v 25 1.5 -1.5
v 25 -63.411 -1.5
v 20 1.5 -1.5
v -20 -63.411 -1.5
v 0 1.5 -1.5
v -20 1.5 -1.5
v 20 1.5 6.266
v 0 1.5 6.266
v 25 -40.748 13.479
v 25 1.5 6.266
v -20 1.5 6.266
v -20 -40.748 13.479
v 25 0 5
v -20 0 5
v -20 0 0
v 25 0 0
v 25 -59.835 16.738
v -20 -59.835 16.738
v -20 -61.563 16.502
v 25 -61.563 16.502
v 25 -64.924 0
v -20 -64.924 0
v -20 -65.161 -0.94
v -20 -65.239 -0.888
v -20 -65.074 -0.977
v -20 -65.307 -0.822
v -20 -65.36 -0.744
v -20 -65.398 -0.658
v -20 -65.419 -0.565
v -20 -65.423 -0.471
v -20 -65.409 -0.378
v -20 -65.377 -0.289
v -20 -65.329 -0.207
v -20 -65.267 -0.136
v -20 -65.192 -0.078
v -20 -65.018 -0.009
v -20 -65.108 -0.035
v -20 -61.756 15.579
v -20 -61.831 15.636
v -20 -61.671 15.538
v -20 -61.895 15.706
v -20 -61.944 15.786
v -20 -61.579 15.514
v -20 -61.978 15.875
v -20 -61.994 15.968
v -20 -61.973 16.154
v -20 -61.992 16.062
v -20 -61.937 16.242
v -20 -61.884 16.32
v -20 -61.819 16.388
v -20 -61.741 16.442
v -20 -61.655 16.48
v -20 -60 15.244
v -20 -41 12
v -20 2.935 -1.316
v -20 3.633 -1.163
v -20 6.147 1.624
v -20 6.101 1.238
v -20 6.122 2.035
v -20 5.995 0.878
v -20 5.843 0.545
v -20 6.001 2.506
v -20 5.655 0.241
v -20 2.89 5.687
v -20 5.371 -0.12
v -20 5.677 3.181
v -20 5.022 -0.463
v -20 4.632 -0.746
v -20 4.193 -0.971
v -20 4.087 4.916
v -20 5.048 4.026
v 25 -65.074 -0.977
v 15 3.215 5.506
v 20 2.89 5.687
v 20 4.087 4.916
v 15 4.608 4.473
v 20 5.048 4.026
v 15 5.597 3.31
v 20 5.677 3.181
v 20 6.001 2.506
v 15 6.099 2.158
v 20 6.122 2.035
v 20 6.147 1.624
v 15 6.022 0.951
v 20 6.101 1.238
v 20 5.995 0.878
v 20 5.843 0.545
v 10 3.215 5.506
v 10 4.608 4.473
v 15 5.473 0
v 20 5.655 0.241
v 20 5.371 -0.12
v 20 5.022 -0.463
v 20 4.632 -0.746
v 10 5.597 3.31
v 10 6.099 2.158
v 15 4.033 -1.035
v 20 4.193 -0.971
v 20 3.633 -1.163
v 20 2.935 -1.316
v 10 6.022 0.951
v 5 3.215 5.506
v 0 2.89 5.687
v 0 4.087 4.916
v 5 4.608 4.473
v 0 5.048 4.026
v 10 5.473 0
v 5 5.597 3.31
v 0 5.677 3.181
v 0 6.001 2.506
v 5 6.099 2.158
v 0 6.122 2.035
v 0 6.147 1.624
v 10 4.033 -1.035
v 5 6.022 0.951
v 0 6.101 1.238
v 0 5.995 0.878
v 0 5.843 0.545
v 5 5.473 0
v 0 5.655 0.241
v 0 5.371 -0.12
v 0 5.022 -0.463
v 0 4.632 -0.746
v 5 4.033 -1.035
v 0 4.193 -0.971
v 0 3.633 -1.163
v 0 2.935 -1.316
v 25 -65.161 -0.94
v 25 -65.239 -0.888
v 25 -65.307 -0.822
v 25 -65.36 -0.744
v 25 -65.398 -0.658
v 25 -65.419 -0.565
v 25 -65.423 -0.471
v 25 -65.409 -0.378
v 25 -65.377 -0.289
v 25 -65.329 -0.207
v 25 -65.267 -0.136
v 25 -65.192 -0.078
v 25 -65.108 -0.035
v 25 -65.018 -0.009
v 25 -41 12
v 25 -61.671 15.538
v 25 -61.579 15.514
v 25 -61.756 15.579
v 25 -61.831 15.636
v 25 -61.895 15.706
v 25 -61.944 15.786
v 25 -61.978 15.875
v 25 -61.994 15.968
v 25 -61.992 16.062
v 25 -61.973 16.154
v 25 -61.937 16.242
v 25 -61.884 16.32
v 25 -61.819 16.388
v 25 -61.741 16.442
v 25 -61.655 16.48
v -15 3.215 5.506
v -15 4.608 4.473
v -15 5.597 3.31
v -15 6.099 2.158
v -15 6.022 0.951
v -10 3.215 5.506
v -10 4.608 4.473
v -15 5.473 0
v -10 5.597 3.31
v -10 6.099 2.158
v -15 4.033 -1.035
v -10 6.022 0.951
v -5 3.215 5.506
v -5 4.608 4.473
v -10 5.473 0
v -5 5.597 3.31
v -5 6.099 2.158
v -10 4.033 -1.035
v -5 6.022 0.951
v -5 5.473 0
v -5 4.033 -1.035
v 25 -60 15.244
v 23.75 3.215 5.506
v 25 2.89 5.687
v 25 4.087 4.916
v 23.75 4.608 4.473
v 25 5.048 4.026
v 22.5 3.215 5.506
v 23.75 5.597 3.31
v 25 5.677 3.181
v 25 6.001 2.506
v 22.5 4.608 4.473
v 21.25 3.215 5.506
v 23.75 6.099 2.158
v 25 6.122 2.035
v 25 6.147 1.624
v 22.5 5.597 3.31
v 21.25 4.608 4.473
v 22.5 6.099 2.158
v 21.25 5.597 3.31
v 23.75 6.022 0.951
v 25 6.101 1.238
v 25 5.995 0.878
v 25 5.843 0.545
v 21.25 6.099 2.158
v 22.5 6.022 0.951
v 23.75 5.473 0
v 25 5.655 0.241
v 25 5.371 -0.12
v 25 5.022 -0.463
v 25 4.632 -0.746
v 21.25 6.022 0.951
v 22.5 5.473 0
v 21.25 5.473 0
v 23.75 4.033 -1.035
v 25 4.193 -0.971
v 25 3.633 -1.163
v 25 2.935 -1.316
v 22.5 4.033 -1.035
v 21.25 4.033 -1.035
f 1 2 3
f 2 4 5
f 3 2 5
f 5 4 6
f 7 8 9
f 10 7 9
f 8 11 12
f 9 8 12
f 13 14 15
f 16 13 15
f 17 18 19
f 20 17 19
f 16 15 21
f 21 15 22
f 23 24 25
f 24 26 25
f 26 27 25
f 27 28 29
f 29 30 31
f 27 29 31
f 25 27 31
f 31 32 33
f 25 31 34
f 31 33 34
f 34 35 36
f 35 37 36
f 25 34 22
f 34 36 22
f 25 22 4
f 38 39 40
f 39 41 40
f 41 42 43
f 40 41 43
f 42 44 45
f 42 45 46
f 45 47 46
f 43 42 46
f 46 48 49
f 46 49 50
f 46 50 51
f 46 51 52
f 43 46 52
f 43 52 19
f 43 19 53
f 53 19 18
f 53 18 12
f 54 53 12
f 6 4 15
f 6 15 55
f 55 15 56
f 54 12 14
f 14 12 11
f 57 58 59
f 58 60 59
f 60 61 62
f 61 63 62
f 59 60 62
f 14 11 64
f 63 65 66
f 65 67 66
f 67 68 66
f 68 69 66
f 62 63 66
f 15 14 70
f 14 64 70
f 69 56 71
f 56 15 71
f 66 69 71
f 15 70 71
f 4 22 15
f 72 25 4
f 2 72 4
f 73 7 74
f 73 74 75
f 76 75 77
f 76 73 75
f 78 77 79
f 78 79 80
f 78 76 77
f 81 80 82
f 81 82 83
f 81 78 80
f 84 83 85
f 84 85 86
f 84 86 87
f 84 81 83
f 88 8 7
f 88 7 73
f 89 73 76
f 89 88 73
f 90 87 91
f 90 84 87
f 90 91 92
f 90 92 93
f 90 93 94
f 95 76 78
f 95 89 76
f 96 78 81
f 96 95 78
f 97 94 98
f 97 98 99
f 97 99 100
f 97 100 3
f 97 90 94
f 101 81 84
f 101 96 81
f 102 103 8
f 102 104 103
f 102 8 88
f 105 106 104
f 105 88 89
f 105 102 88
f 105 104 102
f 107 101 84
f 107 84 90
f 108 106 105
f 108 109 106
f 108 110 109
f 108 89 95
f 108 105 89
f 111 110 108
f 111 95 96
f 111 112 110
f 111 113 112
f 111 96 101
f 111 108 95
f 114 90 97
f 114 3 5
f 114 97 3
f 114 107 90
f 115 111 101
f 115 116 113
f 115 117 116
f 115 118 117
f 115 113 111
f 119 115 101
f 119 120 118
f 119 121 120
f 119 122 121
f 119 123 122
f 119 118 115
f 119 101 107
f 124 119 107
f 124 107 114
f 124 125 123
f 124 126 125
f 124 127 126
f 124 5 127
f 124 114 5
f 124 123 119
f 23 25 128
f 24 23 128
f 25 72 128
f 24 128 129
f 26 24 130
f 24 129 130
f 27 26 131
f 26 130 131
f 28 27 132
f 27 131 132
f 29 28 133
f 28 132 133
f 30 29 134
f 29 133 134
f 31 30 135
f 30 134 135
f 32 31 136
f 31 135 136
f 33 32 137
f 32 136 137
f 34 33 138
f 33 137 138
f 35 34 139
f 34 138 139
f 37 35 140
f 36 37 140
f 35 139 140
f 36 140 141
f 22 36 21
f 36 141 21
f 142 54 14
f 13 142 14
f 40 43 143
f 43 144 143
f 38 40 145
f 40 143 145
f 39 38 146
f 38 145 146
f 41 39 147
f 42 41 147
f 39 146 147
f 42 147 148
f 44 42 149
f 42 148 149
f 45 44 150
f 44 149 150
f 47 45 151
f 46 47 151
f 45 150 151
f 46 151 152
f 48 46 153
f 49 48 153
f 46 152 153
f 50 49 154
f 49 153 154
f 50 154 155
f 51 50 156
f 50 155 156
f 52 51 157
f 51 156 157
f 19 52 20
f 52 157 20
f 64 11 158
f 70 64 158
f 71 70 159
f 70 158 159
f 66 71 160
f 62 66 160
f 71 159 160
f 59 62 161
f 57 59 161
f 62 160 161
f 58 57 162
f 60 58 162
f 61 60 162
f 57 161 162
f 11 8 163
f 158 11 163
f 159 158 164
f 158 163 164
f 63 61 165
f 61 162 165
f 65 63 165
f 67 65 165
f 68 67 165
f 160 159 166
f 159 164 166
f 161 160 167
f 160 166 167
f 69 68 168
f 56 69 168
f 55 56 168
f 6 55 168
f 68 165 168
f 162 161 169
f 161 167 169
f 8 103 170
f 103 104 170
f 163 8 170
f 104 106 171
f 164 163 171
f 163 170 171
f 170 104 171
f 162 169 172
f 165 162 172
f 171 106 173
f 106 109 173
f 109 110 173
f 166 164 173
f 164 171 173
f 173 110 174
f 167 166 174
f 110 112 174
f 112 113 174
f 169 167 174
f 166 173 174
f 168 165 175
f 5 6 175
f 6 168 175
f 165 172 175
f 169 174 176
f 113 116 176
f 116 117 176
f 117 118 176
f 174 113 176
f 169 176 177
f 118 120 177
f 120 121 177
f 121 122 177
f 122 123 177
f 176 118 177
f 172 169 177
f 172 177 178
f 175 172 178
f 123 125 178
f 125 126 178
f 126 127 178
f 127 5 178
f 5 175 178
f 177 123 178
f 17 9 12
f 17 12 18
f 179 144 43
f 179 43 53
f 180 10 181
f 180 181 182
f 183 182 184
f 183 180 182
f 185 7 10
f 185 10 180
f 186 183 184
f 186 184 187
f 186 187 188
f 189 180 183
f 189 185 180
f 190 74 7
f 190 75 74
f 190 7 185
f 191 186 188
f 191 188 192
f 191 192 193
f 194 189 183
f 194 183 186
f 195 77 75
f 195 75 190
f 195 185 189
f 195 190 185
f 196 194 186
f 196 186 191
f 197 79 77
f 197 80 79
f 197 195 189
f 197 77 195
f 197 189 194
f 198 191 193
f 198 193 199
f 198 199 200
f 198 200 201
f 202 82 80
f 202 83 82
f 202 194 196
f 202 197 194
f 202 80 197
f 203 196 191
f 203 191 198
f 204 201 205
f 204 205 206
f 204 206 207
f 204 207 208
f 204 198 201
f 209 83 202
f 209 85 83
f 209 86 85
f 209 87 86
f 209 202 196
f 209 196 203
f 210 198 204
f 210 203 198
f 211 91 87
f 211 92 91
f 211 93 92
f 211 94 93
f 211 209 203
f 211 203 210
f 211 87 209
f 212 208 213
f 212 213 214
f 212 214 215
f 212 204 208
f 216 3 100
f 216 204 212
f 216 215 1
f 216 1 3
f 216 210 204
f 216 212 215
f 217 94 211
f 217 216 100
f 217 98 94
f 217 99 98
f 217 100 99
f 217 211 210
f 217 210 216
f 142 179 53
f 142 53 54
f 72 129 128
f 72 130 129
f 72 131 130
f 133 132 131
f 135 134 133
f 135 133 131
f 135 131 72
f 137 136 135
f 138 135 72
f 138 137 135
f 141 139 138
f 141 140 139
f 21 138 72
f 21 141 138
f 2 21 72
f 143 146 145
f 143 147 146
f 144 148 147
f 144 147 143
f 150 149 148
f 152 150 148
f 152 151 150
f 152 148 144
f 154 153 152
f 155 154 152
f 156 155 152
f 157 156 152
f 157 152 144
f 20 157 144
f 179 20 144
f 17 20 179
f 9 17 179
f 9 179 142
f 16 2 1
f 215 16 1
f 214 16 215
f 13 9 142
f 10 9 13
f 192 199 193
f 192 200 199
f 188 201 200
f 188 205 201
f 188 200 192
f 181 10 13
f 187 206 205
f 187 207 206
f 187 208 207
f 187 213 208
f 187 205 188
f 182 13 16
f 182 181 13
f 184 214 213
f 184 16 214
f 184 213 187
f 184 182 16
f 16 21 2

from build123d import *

# Parameters (mm, degrees)
F1_DEPTH = 20
F2_DEPTH = 25
F3_R     = 0.5


with BuildPart() as f1:
    # F0 (on Right) → F1 (new body, symmetric)
    with BuildSketch(Plane.YZ):
        with BuildLine():
            Line((-41, 12), (0, 5))
            Line((0, 5), (0, 0))
            Line((0, 0), (-13, 0))
            Line((-13, 0), (-60, 0))
            Line((-60, 0), (-68.1802767269, 0))
            Line((-68.1802767269, 0), (-63.4105807199, -1.5))
            Line((-63.4105807199, -1.5), (-15.9391719951, -1.5))
            Line((-15.9391719951, -1.5), (1.5, -1.5))
            add(Edge.make_bspline(
                [(1.5, 6.265607391), (3.9644898677, 5.4991167031), (6.8949081715, 2.4881725012), (5.5893039586, -0.1081592765), (4.0791571197, -1.2143747147), (2.4017938603, -1.4076838823), (1.5, -1.5)],
                knots=[0, 0, 0, 0, 0.3589021343, 0.5755750332, 0.7680765927, 1, 1, 1, 1], degree=3))
            Line((1.5, 6.265607391), (-40.7475553057, 13.4786046383))
            Line((-40.7475553057, 13.4786046383), (-59.8354584084, 16.7375149241))
            Line((-59.8354584084, 16.7375149241), (-64.7895661956, 16.0616332529))
            Line((-64.7895661956, 16.0616332529), (-60, 15.243902439))
            Line((-60, 15.243902439), (-41, 12))
        make_face()
    extrude(amount=F1_DEPTH, both=True)

    # F0 (on Right) → F2 (join)
    with BuildSketch(Plane.YZ):
        with BuildLine():
            Line((-41, 12), (0, 5))
            Line((0, 5), (0, 0))
            Line((0, 0), (-13, 0))
            Line((-13, 0), (-60, 0))
            Line((-60, 0), (-68.1802767269, 0))
            Line((-68.1802767269, 0), (-63.4105807199, -1.5))
            Line((-63.4105807199, -1.5), (-15.9391719951, -1.5))
            Line((-15.9391719951, -1.5), (1.5, -1.5))
            add(Edge.make_bspline(
                [(1.5, 6.265607391), (3.9644898677, 5.4991167031), (6.8949081715, 2.4881725012), (5.5893039586, -0.1081592765), (4.0791571197, -1.2143747147), (2.4017938603, -1.4076838823), (1.5, -1.5)],
                knots=[0, 0, 0, 0, 0.3589021343, 0.5755750332, 0.7680765927, 1, 1, 1, 1], degree=3))
            Line((1.5, 6.265607391), (-40.7475553057, 13.4786046383))
            Line((-40.7475553057, 13.4786046383), (-59.8354584084, 16.7375149241))
            Line((-59.8354584084, 16.7375149241), (-64.7895661956, 16.0616332529))
            Line((-64.7895661956, 16.0616332529), (-60, 15.243902439))
            Line((-60, 15.243902439), (-41, 12))
        make_face()
    extrude(amount=F2_DEPTH)

    # F3
    f3_edges = [f1.edges().sort_by_distance(p)[0] for p in [
        (2.5, -64.789566, 16.061633),
        (2.5, -68.180277, 0),
    ]]
    fillet(f3_edges, radius=F3_R)


solid = f1.part
